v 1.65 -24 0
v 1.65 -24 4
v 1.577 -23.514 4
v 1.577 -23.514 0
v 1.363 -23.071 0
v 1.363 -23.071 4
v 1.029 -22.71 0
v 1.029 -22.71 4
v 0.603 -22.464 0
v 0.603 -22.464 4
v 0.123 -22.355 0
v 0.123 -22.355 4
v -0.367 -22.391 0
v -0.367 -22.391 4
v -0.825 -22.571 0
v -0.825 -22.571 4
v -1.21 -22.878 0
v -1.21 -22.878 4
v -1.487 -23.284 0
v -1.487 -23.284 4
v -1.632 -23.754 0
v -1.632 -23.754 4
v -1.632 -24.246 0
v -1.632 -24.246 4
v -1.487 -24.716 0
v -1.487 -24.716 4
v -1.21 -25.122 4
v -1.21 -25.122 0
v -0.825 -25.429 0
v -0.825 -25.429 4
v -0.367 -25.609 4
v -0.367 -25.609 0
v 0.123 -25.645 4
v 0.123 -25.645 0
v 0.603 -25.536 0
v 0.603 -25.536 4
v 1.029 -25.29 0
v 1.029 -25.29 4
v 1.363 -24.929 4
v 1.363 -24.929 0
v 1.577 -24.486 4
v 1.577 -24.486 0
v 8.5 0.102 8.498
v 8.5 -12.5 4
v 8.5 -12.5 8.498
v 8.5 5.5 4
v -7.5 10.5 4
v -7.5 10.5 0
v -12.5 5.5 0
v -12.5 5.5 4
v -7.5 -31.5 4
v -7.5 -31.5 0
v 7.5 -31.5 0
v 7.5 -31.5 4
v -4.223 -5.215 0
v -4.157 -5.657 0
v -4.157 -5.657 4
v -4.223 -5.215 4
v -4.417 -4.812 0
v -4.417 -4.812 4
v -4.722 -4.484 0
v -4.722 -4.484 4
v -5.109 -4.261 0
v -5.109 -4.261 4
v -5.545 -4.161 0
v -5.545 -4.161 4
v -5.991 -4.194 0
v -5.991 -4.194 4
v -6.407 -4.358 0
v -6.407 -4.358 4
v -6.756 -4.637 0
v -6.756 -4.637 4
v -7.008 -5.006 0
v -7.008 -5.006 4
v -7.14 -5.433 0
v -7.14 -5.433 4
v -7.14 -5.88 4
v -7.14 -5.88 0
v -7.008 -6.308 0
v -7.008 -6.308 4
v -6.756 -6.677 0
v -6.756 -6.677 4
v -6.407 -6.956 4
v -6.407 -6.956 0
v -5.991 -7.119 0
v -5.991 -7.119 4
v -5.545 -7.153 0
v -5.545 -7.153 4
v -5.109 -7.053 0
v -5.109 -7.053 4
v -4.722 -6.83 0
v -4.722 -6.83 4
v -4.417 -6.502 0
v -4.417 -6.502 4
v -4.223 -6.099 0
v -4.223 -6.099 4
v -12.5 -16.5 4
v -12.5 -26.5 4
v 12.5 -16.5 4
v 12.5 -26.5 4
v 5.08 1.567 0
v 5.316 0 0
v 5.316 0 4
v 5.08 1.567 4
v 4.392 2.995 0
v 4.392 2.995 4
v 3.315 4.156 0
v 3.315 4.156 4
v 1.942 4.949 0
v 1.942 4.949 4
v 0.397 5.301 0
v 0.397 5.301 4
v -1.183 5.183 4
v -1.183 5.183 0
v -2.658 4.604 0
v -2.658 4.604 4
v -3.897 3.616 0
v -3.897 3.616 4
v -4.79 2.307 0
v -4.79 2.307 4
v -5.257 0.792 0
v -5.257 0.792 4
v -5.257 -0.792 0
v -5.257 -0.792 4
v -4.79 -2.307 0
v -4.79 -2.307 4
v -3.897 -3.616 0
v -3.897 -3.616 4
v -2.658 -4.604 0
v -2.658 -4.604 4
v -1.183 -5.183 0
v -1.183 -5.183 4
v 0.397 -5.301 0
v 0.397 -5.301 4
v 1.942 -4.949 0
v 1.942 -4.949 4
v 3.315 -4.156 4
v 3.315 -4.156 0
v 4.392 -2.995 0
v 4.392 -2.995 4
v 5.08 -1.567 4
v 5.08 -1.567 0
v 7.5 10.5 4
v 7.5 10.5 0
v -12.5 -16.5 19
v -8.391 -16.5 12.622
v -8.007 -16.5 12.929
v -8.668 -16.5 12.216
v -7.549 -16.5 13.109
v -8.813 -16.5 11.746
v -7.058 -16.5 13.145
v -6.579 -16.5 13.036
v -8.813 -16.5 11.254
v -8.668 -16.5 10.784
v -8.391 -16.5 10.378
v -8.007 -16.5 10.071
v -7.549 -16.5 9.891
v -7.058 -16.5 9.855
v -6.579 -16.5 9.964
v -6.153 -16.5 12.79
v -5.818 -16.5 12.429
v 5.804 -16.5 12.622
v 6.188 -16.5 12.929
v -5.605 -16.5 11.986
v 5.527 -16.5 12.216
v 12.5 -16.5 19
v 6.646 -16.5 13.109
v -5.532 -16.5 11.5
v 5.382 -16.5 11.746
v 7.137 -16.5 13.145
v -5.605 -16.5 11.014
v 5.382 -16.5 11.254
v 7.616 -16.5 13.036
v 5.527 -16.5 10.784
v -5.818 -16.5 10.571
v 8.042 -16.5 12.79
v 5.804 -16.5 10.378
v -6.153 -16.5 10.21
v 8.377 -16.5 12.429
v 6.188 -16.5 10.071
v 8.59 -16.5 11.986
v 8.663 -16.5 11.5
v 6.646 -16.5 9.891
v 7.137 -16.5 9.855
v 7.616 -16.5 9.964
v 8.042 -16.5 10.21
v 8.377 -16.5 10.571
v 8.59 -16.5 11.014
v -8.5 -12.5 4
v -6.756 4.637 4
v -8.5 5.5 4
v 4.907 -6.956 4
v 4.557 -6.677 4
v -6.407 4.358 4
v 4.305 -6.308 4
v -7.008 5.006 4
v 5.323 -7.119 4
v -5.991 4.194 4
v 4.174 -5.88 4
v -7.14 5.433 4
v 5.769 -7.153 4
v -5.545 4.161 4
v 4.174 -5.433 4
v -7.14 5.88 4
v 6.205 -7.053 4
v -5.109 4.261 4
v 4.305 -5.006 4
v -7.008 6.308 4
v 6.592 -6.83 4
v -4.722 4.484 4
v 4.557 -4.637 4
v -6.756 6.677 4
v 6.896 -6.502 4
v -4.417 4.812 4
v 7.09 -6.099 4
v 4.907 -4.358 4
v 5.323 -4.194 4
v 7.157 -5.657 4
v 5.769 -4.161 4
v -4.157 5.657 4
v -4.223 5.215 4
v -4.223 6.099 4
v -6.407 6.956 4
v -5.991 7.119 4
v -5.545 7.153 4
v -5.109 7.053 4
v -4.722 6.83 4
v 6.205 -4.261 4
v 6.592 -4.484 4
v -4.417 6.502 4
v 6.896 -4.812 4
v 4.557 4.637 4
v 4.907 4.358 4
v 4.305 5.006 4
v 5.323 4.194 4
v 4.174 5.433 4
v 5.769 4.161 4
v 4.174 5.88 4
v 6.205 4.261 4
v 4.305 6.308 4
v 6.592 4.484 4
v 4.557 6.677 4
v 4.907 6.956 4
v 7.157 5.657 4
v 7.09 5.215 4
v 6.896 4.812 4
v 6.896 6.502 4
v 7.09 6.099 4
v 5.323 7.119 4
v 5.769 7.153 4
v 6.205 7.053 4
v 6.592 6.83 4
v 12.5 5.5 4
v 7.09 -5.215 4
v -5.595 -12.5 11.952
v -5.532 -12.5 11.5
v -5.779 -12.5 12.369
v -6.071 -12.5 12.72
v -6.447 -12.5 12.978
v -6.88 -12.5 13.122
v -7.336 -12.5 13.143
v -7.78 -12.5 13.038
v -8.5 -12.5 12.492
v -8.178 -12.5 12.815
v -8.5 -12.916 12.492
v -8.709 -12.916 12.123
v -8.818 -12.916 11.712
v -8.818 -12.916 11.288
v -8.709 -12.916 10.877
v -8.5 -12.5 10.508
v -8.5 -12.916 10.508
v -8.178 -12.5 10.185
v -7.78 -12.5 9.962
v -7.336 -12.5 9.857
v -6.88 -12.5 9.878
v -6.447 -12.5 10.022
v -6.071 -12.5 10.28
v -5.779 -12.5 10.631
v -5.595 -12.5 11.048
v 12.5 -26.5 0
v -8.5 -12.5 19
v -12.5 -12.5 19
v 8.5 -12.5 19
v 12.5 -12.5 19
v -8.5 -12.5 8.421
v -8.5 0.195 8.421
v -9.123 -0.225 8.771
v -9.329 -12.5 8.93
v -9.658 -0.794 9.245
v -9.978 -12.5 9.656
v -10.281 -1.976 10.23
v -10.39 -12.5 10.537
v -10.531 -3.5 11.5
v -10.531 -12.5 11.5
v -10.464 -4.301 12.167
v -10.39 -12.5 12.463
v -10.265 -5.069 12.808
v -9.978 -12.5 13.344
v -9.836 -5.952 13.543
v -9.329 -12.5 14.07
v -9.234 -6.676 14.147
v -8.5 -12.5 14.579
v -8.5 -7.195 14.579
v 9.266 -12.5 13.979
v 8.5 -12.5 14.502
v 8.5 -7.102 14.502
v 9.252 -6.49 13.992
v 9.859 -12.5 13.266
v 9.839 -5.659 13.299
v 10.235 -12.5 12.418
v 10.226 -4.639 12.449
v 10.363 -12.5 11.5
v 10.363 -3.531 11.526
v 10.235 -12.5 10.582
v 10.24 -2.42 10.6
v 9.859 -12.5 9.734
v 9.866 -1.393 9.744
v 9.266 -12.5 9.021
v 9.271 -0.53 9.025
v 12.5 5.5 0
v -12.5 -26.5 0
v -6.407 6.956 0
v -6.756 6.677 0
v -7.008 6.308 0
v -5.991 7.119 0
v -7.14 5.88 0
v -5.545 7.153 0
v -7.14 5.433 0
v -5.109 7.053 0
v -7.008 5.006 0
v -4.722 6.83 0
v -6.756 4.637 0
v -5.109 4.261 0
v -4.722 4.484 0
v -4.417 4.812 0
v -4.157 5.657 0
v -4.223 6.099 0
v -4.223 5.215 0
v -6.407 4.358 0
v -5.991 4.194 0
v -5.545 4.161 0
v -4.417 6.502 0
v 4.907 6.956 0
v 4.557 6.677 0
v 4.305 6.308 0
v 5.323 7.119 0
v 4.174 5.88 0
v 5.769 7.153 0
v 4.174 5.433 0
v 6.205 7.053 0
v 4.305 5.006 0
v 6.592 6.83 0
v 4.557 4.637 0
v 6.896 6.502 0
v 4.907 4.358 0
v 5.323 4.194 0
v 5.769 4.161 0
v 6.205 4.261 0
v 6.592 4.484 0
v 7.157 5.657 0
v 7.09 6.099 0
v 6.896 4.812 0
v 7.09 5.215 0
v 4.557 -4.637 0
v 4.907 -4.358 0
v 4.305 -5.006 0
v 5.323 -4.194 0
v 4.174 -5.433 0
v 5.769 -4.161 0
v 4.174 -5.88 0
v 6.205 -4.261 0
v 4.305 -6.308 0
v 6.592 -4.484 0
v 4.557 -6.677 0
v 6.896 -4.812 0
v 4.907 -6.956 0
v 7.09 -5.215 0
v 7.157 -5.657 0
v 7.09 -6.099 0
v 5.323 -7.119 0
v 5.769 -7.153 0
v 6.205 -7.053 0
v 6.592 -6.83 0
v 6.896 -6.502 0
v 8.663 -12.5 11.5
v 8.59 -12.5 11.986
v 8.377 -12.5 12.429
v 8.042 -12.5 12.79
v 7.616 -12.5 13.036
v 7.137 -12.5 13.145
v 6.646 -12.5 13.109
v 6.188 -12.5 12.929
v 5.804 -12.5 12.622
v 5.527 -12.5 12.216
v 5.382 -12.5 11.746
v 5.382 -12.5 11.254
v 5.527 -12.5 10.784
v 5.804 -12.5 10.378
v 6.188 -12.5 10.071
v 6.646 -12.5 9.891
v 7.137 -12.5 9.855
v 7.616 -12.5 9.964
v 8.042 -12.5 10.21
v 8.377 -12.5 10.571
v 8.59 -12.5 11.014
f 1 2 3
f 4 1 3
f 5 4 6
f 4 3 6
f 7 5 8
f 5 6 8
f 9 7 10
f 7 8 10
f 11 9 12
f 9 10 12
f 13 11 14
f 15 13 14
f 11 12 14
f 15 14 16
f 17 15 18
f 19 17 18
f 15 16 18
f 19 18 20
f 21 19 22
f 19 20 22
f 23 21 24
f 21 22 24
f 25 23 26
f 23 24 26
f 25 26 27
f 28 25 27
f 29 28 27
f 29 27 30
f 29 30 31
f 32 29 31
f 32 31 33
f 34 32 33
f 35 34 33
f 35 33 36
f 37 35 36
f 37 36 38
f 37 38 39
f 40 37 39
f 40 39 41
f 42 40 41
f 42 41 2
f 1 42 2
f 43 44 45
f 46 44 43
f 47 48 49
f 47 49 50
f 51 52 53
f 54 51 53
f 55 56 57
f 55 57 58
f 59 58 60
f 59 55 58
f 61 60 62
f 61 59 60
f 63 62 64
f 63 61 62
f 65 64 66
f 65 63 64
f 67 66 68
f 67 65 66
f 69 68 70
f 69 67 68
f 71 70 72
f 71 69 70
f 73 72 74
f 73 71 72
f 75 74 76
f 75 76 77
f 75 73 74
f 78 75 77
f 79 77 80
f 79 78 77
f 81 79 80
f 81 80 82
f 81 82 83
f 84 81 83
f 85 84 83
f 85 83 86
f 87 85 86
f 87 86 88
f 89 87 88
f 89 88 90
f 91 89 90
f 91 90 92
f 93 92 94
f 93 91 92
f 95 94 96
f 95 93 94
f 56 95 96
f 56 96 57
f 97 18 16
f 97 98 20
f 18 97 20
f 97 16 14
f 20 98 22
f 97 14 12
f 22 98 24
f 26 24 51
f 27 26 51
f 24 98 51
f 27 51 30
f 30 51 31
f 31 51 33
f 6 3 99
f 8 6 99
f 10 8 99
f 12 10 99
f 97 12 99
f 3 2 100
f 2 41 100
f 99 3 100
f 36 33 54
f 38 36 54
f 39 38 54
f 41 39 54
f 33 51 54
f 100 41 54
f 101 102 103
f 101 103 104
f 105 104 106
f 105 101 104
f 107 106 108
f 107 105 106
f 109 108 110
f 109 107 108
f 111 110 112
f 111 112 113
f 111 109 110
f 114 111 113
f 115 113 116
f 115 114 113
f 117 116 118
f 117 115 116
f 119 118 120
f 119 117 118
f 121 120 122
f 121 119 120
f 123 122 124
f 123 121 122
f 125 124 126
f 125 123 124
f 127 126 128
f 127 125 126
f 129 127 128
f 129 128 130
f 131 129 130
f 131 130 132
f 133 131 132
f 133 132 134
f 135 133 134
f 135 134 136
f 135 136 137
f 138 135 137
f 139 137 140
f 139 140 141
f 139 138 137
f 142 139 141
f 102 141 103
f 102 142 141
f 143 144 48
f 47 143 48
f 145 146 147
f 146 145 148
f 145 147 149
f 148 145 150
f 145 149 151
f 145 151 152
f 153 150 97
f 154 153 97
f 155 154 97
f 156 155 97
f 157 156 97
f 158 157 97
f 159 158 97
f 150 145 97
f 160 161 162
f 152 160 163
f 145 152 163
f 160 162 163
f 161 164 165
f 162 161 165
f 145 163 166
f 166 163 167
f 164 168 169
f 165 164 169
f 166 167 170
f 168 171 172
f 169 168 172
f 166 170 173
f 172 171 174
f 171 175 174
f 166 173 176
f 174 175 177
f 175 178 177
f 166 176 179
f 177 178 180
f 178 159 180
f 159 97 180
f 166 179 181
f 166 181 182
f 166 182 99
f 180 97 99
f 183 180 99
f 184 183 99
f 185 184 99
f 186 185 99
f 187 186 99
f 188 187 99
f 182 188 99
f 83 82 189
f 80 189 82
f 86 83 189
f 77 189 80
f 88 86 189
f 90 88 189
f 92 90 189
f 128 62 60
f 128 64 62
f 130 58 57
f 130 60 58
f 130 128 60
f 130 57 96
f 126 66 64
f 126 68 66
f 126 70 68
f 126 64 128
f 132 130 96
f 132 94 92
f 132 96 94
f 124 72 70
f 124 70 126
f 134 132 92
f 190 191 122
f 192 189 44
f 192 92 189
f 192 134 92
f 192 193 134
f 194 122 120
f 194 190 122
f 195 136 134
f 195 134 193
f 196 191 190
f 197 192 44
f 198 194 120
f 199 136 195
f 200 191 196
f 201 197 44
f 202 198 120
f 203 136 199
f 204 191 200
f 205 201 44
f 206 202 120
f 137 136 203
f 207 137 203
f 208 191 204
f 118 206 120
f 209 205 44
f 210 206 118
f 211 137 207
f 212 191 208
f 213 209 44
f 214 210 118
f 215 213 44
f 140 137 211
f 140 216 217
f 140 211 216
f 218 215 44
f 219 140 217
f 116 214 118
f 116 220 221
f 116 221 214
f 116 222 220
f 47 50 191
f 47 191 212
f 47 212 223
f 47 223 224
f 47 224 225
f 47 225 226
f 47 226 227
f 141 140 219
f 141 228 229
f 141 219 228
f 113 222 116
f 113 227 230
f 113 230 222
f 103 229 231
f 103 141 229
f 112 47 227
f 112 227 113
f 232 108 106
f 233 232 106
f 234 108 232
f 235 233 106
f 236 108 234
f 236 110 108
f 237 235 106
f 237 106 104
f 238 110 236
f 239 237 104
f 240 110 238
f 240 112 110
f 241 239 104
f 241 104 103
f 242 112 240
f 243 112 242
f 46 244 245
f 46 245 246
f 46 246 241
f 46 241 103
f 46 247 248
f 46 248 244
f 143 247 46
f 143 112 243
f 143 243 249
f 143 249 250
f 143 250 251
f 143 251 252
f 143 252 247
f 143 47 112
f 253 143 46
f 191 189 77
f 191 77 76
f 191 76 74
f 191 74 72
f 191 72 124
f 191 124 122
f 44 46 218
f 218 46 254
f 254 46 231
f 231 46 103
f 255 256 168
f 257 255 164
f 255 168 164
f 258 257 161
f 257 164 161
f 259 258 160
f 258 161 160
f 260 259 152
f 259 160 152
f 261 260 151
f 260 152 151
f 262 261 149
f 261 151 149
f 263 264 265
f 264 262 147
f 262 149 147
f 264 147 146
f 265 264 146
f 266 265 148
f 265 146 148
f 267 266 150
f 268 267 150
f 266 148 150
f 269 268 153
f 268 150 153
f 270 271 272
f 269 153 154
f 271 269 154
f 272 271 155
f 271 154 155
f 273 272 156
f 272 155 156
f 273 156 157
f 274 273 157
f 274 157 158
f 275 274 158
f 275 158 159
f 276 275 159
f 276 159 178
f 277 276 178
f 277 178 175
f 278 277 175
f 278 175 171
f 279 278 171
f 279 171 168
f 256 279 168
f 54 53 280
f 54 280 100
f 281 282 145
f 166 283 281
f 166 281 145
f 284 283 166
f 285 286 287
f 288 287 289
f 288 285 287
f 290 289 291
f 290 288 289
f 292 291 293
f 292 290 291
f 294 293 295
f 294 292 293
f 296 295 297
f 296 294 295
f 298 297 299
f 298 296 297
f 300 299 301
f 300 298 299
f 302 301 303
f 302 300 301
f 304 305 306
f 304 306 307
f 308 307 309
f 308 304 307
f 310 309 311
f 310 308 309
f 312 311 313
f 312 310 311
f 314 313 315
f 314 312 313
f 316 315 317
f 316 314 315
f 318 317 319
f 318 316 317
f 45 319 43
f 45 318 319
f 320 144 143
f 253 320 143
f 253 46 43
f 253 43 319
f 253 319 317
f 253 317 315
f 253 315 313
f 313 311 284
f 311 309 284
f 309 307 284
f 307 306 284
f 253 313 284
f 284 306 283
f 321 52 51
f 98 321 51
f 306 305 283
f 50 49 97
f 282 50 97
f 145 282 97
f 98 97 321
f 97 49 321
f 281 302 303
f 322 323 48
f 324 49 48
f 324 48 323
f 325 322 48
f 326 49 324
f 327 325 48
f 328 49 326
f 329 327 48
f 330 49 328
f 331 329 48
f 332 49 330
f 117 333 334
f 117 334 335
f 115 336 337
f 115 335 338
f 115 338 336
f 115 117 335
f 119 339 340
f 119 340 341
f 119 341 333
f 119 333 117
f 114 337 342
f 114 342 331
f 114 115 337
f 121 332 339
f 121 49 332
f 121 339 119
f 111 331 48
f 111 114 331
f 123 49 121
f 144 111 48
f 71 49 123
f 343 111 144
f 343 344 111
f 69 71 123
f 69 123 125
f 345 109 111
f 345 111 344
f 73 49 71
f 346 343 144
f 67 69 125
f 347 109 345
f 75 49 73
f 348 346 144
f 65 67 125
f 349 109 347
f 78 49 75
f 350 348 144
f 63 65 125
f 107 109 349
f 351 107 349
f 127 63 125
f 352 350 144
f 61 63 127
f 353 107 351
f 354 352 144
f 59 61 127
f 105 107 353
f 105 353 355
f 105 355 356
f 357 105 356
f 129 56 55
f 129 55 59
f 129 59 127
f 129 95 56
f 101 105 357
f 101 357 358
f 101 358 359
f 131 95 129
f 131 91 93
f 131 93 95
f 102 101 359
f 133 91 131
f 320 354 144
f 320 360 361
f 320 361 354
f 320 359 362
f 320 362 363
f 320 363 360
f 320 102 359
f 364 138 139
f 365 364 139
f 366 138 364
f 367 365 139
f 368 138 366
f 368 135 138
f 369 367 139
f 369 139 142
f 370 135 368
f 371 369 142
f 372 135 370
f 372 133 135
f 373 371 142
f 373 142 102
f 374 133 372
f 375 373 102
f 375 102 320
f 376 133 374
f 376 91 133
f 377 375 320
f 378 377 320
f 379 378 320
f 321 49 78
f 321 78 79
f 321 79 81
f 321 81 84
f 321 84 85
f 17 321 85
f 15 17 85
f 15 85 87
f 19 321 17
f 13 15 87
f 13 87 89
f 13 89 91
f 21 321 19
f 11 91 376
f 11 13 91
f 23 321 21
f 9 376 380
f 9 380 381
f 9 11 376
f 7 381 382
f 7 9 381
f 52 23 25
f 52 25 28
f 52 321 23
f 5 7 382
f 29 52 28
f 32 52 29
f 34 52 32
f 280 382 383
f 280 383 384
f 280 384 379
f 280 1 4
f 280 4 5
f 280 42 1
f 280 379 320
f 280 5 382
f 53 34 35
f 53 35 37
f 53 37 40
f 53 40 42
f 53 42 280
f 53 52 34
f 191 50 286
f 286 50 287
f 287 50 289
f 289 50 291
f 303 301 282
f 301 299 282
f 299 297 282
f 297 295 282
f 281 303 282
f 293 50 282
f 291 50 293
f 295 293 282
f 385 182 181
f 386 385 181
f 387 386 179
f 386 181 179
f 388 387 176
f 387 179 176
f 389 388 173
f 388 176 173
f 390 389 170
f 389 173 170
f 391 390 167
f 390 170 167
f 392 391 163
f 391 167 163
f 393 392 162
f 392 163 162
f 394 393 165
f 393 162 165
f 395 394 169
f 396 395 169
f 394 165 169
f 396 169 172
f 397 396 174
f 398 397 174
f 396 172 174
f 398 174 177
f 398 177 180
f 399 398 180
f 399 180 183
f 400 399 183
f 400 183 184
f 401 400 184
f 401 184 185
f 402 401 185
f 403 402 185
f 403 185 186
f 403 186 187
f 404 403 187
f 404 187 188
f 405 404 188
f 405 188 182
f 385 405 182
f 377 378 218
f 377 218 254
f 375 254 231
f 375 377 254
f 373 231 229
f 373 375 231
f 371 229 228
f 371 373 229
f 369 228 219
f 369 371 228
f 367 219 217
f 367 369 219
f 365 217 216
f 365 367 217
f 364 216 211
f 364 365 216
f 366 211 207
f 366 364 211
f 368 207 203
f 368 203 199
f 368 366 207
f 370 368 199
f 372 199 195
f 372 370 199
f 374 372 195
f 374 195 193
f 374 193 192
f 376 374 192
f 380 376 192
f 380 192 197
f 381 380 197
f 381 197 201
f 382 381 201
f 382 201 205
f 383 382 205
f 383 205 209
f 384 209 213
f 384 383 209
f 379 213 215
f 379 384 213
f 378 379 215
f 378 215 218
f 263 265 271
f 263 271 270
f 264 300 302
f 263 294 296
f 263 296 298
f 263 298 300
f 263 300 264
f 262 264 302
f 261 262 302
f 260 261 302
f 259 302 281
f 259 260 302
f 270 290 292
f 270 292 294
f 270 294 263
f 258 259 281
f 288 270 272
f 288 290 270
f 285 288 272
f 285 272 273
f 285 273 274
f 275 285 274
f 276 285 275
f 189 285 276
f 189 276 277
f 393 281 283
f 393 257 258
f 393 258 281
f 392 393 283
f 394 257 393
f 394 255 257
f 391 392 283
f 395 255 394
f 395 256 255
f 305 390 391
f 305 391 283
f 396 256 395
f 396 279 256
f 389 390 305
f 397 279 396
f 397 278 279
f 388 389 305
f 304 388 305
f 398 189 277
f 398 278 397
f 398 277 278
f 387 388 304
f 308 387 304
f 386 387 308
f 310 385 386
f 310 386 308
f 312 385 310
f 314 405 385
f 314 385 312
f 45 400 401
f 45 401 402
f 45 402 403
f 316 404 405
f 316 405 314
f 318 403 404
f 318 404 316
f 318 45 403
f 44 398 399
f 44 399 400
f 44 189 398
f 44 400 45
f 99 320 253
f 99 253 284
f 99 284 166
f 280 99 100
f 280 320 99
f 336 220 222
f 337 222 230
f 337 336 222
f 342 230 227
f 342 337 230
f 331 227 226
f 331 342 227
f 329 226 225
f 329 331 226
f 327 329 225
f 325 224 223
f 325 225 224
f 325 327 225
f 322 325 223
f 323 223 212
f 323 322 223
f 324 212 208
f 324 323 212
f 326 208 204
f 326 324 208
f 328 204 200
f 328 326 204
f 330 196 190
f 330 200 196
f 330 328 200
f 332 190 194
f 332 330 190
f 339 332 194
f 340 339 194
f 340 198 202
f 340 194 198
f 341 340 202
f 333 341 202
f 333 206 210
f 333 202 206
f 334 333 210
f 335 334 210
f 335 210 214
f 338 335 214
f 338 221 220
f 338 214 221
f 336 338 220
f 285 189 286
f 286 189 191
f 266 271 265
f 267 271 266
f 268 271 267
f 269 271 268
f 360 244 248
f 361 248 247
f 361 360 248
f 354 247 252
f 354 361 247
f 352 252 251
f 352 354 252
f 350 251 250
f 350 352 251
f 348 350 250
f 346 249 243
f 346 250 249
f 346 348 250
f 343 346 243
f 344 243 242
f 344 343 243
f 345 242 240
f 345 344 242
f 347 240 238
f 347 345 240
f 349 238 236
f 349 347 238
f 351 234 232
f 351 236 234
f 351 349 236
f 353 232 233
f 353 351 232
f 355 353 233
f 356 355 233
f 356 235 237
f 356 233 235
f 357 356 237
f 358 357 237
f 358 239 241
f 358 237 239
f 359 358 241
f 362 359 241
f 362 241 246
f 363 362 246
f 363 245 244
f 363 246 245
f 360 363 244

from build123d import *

# Parameters (mm, degrees)
F0_R      = 1.5
F0_R_2    = 5.3160889555
F1_DEPTH  = 4
F2_SIZE   = 5
F3_W      = 25
F3_H      = 4
F4_DEPTH  = 15
F5_W      = 25
F5_H      = 15
F6_DEPTH  = 4
F7_R      = 1.65
F8_DEPTH  = 25
F9_R      = 1.65
F10_DEPTH = 25
F11_W     = 4
F11_H     = 18.4155227914
F11_H_2   = 18
F12_DEPTH = 15
F14_DEPTH = 28.2
F15_R     = 3.349705052
F16_DEPTH = 25
F17_SIZE  = 5


with BuildPart() as f1:
    # F0 (on Top) → F1 (new body)
    with BuildSketch(Plane.XY):
        with BuildLine():
            Line((12.5, -10.5), (12.5, 10.5))
            Line((12.5, 10.5), (-12.5, 10.5))
            Line((-12.5, 10.5), (-12.5, -10.5))
            ThreePointArc((-12.5, -10.5), (-11.9142135624, -11.9142135624), (-10.5, -12.5))
            Line((-10.5, -12.5), (10.5, -12.5))
            ThreePointArc((10.5, -12.5), (11.9142135624, -11.9142135624), (12.5, -10.5))
        make_face()
        with Locations((-5.6568542495, -5.6568542495)):
            Circle(F0_R, mode=Mode.SUBTRACT)
        with Locations((5.6568542495, -5.6568542495)):
            Circle(F0_R, mode=Mode.SUBTRACT)
        with Locations((-5.6568542495, 5.6568542495)):
            Circle(F0_R, mode=Mode.SUBTRACT)
        Circle(F0_R_2, mode=Mode.SUBTRACT)
        with Locations((5.6568542495, 5.6568542495)):
            Circle(F0_R, mode=Mode.SUBTRACT)
        with BuildLine():
            Line((12.5, -16.5), (12.5, -10.5))
            ThreePointArc((12.5, -10.5), (11.9142135624, -11.9142135624), (10.5, -12.5))
            Line((10.5, -12.5), (-10.5, -12.5))
            ThreePointArc((-10.5, -12.5), (-11.9142135624, -11.9142135624), (-12.5, -10.5))
            Line((-12.5, -10.5), (-12.5, -16.5))
            Line((-12.5, -16.5), (-10.5, -16.5))
            Line((-10.5, -16.5), (10.5, -16.5))
            Line((10.5, -16.5), (12.5, -16.5))
        make_face()
    extrude(amount=F1_DEPTH)

    # F2
    f2_edges = [f1.edges().sort_by_distance(p)[0] for p in [
        (12.5, 10.5, 2),
        (-12.5, 10.5, 2),
    ]]
    chamfer(f2_edges, length=F2_SIZE)

    # F3 (on face) → F4 (join)
    with BuildSketch(Plane.XY.offset(4)):
        with Locations((0, -14.5)):
            Rectangle(F3_W, F3_H)
    extrude(amount=F4_DEPTH)

    # F5 (on face) → F6 (join)
    with BuildSketch(Plane(origin=(0, 0, 0), x_dir=(1, 0, 0), z_dir=(0, 0, -1))):
        with Locations((0, 24)):
            Rectangle(F5_W, F5_H)
    extrude(amount=-F6_DEPTH)

    # F7 (on face) → F8 (cut)
    with BuildSketch(Plane.XZ.offset(16.5)):
        with Locations((-7.1815280244, 11.5)):
            Circle(F7_R)
        with Locations((7.0133642294, 11.5)):
            Circle(F7_R)
    extrude(amount=-F8_DEPTH, mode=Mode.SUBTRACT)

    # F9 (on face) → F10 (cut)
    with BuildSketch(Plane.XY.offset(4)):
        with Locations((0, -24)):
            Circle(F9_R)
    extrude(amount=-F10_DEPTH, mode=Mode.SUBTRACT)

    # F11 (on face) → F12 (join, through all)
    with BuildSketch(Plane.XY.offset(4)):
        with Locations((-10.5, -3.7077613957)):
            Rectangle(F11_W, F11_H)
        with Locations((10.5, -3.5)):
            Rectangle(F11_W, F11_H_2)
    extrude(amount=F12_DEPTH)

    # F13 (on face) → F14 (cut)
    with BuildSketch(Plane(origin=(-12.5, 0, 0), x_dir=(0, -1, 0), z_dir=(-1, 0, 0))):
        Polygon((-5.5, 4), (12.5, 19), (-5.5, 19), align=None)
    extrude(amount=-F14_DEPTH, mode=Mode.SUBTRACT)

    # F15 (on face) → F16 (cut)
    with BuildSketch(Plane(origin=(0, -12.5, 0), x_dir=(-1, 0, 0), z_dir=(0, 1, 0))):
        with Locations((-7.0133642294, 11.5)):
            Circle(F15_R)
        with Locations((7.1815280244, 11.5)):
            Circle(F15_R)
    extrude(amount=F16_DEPTH, mode=Mode.SUBTRACT)

    # F17
    f17_edges = [f1.edges().sort_by_distance(p)[0] for p in [
        (-12.5, -31.5, 2),
        (12.5, -31.5, 2),
    ]]
    chamfer(f17_edges, length=F17_SIZE)


solid = f1.part
